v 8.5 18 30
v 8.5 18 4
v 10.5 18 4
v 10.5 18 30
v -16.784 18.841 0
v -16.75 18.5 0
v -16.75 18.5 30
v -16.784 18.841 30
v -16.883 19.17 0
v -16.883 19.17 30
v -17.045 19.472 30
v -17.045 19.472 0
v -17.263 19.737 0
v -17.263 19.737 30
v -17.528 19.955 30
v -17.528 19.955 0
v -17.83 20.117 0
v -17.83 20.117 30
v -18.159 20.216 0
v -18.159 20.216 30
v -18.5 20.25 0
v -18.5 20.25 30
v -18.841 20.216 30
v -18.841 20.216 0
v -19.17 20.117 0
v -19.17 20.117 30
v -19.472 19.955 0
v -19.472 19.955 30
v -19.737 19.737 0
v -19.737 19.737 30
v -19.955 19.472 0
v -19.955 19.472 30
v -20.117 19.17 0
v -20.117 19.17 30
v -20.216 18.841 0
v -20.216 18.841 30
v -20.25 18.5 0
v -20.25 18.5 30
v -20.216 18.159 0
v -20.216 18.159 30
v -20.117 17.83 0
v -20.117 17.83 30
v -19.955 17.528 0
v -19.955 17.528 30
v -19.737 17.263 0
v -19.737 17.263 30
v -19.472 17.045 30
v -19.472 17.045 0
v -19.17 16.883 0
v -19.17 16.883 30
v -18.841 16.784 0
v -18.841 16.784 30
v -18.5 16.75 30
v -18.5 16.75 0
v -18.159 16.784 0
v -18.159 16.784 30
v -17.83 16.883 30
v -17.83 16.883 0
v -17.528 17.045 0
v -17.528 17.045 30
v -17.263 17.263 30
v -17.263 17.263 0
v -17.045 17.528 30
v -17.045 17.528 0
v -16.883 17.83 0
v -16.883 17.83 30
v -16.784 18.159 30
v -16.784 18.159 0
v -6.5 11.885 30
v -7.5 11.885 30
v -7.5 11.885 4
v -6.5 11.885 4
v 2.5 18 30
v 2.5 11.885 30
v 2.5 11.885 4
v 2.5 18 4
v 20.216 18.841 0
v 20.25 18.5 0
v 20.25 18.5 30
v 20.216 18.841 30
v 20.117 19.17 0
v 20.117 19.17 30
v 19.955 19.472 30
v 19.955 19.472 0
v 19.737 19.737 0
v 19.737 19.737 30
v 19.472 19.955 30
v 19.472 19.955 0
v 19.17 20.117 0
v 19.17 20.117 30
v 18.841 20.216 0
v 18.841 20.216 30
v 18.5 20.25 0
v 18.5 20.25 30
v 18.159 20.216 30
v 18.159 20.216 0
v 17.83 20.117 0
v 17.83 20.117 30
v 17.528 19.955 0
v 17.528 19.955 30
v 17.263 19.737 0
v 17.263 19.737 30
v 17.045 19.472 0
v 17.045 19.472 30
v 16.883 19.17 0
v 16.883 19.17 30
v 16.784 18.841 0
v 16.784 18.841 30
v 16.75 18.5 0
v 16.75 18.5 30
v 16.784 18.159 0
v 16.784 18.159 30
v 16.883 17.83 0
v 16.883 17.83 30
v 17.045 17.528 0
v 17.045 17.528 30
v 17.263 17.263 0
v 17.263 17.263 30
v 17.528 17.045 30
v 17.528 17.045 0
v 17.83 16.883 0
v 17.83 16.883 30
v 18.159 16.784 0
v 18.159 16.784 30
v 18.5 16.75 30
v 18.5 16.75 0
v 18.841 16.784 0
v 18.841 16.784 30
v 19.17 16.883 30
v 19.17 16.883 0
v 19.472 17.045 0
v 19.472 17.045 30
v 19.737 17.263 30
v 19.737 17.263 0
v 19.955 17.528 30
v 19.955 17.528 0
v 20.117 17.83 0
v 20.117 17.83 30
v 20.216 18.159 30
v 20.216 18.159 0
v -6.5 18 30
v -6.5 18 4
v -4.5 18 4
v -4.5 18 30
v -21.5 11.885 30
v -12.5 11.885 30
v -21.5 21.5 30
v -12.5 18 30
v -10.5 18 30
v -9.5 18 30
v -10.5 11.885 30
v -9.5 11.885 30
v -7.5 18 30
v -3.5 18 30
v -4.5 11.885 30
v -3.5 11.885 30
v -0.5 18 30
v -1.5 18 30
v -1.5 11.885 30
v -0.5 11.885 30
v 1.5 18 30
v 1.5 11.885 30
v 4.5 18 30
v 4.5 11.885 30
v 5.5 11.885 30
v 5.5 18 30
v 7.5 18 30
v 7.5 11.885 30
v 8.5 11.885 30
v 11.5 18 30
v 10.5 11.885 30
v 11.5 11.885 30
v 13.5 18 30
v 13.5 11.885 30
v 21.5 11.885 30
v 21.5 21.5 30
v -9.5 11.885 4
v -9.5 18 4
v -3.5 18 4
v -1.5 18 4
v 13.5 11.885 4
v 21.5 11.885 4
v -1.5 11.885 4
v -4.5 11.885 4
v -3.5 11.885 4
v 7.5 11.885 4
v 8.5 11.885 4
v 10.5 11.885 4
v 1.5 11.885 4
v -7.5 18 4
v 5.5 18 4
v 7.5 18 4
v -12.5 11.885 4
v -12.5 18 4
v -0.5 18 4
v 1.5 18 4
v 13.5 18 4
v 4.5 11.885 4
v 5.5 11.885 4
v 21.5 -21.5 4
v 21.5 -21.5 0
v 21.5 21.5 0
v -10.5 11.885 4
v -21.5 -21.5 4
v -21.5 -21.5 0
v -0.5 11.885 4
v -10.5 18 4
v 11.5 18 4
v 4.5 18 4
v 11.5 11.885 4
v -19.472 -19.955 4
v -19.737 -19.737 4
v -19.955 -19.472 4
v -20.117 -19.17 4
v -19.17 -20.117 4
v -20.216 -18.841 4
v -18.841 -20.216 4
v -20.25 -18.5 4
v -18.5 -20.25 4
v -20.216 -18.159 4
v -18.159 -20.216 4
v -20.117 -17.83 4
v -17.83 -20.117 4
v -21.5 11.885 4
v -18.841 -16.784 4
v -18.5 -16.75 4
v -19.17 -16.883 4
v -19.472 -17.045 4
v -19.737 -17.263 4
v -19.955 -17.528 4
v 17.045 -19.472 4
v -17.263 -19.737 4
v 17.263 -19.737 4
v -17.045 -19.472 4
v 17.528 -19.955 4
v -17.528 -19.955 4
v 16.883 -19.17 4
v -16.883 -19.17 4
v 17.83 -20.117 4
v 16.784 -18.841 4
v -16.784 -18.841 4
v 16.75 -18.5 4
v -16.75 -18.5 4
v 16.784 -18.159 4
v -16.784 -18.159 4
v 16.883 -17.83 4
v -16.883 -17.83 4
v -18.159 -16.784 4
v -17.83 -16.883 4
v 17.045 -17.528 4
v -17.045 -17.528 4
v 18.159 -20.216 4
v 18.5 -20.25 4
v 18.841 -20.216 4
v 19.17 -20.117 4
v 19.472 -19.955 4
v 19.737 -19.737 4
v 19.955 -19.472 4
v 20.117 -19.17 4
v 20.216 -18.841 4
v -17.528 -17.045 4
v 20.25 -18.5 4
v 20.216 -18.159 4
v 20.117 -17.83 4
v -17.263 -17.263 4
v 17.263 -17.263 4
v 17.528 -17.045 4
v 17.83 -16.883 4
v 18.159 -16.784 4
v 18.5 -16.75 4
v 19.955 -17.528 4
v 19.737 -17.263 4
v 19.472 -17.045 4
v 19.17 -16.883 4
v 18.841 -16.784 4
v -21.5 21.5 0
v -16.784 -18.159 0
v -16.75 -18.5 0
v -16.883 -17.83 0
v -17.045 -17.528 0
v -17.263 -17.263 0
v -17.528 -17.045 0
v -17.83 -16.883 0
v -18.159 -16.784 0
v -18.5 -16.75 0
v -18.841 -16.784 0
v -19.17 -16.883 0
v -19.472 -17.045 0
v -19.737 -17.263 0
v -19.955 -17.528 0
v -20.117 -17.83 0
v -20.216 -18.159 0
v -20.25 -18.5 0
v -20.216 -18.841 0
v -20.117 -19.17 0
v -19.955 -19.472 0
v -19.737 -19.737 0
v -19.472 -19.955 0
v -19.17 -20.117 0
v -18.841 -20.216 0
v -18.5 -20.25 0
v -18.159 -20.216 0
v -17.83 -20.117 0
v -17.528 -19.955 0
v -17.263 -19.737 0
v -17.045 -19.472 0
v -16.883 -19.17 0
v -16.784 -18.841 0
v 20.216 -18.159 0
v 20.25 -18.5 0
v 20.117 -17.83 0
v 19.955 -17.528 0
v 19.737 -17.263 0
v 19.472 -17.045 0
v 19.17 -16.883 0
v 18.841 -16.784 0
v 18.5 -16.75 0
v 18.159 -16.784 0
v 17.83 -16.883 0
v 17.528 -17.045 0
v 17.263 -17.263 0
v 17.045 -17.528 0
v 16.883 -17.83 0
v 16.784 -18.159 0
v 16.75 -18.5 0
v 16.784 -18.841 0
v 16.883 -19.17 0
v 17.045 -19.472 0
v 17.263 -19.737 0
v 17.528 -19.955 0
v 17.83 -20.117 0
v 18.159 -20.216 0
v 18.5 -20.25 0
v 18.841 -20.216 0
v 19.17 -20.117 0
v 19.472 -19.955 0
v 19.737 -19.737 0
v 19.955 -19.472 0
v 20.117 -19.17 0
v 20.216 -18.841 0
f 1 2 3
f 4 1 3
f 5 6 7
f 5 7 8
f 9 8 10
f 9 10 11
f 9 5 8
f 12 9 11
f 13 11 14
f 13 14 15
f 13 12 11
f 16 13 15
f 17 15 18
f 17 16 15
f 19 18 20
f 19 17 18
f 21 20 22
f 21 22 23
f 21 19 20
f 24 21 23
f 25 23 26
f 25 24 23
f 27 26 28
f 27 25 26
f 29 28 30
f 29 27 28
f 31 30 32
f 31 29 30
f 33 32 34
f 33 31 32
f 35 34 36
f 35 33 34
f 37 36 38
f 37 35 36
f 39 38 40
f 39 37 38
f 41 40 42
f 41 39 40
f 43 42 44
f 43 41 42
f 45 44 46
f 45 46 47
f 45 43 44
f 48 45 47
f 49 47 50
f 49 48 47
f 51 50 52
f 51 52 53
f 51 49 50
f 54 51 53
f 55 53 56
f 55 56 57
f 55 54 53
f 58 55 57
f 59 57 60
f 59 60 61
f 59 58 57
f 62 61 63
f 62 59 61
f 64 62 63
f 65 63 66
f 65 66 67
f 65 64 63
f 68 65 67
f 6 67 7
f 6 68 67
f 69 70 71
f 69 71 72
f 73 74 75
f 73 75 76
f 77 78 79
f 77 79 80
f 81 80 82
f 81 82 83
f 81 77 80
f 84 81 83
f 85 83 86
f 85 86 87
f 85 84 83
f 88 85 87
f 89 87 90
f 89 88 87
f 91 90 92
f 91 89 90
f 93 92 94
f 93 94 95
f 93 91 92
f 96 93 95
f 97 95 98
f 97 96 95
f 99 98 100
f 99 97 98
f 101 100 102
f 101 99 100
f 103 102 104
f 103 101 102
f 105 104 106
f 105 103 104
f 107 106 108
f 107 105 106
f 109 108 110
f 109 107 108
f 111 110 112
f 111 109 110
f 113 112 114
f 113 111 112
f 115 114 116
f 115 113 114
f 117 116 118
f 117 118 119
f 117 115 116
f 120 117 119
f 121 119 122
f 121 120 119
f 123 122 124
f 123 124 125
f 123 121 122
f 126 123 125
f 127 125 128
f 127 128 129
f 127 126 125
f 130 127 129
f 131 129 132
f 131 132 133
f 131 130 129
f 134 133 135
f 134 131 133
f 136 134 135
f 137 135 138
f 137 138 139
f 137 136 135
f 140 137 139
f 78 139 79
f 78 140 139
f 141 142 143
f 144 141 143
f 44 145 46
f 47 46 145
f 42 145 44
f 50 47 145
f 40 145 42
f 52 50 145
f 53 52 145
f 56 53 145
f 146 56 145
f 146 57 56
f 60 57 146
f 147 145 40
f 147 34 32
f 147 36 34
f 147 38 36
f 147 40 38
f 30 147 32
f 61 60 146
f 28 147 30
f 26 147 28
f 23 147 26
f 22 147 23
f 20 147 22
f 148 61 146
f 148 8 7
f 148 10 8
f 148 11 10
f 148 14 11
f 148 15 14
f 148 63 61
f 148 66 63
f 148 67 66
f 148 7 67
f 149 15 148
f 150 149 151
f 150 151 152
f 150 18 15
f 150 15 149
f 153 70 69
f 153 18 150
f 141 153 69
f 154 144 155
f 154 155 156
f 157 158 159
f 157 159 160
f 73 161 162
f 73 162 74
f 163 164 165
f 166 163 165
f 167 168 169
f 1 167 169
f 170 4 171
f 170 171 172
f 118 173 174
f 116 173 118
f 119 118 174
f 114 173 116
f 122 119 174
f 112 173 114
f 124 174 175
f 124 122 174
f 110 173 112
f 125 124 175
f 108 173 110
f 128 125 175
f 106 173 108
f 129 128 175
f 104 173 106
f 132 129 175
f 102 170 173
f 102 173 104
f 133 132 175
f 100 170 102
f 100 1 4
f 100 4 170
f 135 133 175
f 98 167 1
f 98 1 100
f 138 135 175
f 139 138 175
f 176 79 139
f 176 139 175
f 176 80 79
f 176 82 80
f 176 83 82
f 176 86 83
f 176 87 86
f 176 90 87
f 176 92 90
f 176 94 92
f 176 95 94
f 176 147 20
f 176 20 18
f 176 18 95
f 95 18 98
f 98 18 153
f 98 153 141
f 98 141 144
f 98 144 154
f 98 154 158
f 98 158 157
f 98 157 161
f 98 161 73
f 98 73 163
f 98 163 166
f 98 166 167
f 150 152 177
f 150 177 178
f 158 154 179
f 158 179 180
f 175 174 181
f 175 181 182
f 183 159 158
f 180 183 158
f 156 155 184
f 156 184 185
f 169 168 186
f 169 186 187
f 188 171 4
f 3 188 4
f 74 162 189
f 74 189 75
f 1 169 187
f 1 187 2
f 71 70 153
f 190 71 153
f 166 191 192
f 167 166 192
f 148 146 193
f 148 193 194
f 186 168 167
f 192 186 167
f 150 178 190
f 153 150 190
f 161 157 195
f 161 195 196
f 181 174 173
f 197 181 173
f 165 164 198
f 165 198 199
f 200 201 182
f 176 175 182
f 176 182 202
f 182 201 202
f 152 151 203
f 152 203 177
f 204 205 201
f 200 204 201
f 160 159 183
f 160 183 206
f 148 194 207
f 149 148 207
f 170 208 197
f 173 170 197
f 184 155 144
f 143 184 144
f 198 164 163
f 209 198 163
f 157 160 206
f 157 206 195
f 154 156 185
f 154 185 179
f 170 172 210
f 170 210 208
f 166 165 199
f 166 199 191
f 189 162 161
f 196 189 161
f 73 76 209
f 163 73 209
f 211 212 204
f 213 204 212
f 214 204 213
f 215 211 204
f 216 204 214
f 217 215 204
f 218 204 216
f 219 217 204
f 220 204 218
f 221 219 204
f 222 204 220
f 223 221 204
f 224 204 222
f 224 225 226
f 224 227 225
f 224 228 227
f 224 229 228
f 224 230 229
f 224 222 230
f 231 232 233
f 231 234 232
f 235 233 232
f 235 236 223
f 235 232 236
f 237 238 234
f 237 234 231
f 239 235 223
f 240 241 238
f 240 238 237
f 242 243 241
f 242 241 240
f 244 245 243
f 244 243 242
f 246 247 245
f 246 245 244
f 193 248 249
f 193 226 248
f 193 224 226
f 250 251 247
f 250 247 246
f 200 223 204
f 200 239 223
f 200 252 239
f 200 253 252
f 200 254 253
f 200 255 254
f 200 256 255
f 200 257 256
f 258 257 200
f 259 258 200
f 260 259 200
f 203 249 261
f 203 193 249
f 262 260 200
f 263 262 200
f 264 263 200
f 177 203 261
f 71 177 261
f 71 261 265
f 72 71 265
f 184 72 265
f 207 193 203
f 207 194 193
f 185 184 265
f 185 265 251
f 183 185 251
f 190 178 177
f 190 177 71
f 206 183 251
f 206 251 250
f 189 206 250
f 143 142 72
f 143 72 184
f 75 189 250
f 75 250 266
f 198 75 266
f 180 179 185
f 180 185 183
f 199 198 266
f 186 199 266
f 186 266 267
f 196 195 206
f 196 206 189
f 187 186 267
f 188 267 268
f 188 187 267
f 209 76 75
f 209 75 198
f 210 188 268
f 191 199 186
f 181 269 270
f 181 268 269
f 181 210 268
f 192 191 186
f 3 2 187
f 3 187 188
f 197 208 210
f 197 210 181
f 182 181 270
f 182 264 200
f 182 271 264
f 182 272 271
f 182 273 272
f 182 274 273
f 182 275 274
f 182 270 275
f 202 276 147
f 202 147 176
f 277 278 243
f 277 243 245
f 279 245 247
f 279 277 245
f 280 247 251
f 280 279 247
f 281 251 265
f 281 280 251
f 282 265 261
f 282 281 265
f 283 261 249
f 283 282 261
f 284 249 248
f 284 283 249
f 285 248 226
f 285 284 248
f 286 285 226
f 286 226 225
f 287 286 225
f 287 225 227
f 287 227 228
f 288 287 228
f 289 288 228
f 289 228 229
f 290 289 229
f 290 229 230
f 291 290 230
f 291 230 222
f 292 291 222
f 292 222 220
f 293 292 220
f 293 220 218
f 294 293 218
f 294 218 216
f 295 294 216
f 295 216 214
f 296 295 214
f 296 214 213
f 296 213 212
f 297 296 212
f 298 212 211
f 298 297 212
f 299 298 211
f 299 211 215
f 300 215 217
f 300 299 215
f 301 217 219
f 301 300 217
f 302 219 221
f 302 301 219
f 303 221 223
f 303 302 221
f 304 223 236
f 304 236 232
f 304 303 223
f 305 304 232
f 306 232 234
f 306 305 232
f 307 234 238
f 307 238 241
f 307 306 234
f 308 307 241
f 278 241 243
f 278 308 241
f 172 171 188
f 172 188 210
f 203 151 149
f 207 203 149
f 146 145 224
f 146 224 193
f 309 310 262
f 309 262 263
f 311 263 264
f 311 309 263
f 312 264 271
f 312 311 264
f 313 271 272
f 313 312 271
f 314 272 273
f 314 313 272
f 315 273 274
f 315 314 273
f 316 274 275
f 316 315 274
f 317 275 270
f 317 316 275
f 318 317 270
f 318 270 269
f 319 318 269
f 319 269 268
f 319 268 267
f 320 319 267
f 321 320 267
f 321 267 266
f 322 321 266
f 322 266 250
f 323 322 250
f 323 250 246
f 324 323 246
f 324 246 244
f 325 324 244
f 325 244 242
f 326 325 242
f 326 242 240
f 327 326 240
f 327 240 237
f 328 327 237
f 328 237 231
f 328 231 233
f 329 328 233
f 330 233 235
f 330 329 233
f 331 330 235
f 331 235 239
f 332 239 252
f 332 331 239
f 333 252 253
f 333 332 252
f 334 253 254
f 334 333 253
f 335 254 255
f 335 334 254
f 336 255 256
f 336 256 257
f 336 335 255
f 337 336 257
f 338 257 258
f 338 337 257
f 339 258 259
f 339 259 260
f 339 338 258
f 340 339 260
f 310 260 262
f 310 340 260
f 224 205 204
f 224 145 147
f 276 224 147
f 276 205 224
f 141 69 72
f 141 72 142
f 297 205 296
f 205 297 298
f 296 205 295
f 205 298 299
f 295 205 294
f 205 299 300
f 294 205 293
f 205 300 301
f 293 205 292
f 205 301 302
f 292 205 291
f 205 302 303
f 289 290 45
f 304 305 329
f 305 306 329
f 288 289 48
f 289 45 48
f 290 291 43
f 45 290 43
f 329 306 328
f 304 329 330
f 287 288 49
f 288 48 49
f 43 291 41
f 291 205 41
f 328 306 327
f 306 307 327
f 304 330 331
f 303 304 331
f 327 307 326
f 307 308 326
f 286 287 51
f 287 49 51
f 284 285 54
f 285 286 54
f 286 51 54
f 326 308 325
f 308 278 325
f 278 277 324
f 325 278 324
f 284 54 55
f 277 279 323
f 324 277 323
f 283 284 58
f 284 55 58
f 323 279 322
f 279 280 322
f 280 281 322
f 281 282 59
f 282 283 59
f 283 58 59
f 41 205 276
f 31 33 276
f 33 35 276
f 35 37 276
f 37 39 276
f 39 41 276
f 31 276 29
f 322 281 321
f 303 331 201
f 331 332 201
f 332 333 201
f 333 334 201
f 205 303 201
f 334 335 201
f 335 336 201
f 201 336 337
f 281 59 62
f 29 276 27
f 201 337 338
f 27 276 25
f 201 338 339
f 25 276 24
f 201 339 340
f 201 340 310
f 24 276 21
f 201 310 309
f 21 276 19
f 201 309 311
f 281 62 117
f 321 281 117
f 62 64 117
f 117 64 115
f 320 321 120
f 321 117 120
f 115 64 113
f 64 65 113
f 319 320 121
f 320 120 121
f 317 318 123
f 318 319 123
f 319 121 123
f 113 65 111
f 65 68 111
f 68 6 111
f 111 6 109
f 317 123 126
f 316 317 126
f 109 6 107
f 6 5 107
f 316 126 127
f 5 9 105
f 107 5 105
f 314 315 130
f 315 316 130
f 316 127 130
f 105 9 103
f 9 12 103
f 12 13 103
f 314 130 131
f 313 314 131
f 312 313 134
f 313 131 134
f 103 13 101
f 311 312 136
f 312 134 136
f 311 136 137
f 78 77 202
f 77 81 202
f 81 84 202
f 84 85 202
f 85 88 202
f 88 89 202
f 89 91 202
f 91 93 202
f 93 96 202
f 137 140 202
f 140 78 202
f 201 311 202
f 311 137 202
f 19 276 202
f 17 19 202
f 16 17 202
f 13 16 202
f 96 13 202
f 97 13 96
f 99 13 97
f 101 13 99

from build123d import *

# Parameters (mm, degrees)
SKETCH_1_W          = 43
SKETCH_1_H          = 43
SKETCH_1_R          = 1.75
EXTRUDE_1_DEPTH     = 30
SKETCH_2_W          = 43
SKETCH_2_H          = 33.384643537
SKETCH_2_R          = 1.75
CUT_EXTRUDE_1_DEPTH = 26
SKETCH_3_W          = 2
SKETCH_3_H          = 6.115356463
CUT_EXTRUDE_2_DEPTH = 26


with BuildPart() as part:
    # 草图1 → 凸台-拉伸1 (new body)
    with BuildSketch(Plane.XY):
        Rectangle(SKETCH_1_W, SKETCH_1_H)
        with Locations((-18.5, 18.5)):
            Circle(SKETCH_1_R, mode=Mode.SUBTRACT)
        with Locations((-18.5, -18.5)):
            Circle(SKETCH_1_R, mode=Mode.SUBTRACT)
        with Locations((18.5, -18.5)):
            Circle(SKETCH_1_R, mode=Mode.SUBTRACT)
        with Locations((18.5, 18.5)):
            Circle(SKETCH_1_R, mode=Mode.SUBTRACT)
    extrude(amount=EXTRUDE_1_DEPTH)

    # 草图2 → 切除-拉伸1 (cut)
    with BuildSketch(Plane.XY.offset(30)):
        with Locations((0, -4.807678231)):
            Rectangle(SKETCH_2_W, SKETCH_2_H)
        with Locations((-18.5, -18.5)):
            Circle(SKETCH_2_R, mode=Mode.SUBTRACT)
        with Locations((18.5, -18.5)):
            Circle(SKETCH_2_R, mode=Mode.SUBTRACT)
    extrude(amount=-CUT_EXTRUDE_1_DEPTH, mode=Mode.SUBTRACT)

    # 草图3 → 切除-拉伸2 (cut)
    with BuildSketch(Plane.XY.offset(30)):
        with Locations((-11.5, 14.942321769)):
            Rectangle(SKETCH_3_W, SKETCH_3_H)
        with Locations((-8.5, 14.942321769)):
            Rectangle(SKETCH_3_W, SKETCH_3_H)
        with Locations((-5.5, 14.942321769)):
            Rectangle(SKETCH_3_W, SKETCH_3_H)
        with Locations((-2.5, 14.942321769)):
            Rectangle(SKETCH_3_W, SKETCH_3_H)
        with Locations((0.5, 14.942321769)):
            Rectangle(SKETCH_3_W, SKETCH_3_H)
        with Locations((3.5, 14.942321769)):
            Rectangle(SKETCH_3_W, SKETCH_3_H)
        with Locations((6.5, 14.942321769)):
            Rectangle(SKETCH_3_W, SKETCH_3_H)
        with Locations((9.5, 14.942321769)):
            Rectangle(SKETCH_3_W, SKETCH_3_H)
        with Locations((12.5, 14.942321769)):
            Rectangle(SKETCH_3_W, SKETCH_3_H)
    extrude(amount=-CUT_EXTRUDE_2_DEPTH, mode=Mode.SUBTRACT)


solid = part.part
